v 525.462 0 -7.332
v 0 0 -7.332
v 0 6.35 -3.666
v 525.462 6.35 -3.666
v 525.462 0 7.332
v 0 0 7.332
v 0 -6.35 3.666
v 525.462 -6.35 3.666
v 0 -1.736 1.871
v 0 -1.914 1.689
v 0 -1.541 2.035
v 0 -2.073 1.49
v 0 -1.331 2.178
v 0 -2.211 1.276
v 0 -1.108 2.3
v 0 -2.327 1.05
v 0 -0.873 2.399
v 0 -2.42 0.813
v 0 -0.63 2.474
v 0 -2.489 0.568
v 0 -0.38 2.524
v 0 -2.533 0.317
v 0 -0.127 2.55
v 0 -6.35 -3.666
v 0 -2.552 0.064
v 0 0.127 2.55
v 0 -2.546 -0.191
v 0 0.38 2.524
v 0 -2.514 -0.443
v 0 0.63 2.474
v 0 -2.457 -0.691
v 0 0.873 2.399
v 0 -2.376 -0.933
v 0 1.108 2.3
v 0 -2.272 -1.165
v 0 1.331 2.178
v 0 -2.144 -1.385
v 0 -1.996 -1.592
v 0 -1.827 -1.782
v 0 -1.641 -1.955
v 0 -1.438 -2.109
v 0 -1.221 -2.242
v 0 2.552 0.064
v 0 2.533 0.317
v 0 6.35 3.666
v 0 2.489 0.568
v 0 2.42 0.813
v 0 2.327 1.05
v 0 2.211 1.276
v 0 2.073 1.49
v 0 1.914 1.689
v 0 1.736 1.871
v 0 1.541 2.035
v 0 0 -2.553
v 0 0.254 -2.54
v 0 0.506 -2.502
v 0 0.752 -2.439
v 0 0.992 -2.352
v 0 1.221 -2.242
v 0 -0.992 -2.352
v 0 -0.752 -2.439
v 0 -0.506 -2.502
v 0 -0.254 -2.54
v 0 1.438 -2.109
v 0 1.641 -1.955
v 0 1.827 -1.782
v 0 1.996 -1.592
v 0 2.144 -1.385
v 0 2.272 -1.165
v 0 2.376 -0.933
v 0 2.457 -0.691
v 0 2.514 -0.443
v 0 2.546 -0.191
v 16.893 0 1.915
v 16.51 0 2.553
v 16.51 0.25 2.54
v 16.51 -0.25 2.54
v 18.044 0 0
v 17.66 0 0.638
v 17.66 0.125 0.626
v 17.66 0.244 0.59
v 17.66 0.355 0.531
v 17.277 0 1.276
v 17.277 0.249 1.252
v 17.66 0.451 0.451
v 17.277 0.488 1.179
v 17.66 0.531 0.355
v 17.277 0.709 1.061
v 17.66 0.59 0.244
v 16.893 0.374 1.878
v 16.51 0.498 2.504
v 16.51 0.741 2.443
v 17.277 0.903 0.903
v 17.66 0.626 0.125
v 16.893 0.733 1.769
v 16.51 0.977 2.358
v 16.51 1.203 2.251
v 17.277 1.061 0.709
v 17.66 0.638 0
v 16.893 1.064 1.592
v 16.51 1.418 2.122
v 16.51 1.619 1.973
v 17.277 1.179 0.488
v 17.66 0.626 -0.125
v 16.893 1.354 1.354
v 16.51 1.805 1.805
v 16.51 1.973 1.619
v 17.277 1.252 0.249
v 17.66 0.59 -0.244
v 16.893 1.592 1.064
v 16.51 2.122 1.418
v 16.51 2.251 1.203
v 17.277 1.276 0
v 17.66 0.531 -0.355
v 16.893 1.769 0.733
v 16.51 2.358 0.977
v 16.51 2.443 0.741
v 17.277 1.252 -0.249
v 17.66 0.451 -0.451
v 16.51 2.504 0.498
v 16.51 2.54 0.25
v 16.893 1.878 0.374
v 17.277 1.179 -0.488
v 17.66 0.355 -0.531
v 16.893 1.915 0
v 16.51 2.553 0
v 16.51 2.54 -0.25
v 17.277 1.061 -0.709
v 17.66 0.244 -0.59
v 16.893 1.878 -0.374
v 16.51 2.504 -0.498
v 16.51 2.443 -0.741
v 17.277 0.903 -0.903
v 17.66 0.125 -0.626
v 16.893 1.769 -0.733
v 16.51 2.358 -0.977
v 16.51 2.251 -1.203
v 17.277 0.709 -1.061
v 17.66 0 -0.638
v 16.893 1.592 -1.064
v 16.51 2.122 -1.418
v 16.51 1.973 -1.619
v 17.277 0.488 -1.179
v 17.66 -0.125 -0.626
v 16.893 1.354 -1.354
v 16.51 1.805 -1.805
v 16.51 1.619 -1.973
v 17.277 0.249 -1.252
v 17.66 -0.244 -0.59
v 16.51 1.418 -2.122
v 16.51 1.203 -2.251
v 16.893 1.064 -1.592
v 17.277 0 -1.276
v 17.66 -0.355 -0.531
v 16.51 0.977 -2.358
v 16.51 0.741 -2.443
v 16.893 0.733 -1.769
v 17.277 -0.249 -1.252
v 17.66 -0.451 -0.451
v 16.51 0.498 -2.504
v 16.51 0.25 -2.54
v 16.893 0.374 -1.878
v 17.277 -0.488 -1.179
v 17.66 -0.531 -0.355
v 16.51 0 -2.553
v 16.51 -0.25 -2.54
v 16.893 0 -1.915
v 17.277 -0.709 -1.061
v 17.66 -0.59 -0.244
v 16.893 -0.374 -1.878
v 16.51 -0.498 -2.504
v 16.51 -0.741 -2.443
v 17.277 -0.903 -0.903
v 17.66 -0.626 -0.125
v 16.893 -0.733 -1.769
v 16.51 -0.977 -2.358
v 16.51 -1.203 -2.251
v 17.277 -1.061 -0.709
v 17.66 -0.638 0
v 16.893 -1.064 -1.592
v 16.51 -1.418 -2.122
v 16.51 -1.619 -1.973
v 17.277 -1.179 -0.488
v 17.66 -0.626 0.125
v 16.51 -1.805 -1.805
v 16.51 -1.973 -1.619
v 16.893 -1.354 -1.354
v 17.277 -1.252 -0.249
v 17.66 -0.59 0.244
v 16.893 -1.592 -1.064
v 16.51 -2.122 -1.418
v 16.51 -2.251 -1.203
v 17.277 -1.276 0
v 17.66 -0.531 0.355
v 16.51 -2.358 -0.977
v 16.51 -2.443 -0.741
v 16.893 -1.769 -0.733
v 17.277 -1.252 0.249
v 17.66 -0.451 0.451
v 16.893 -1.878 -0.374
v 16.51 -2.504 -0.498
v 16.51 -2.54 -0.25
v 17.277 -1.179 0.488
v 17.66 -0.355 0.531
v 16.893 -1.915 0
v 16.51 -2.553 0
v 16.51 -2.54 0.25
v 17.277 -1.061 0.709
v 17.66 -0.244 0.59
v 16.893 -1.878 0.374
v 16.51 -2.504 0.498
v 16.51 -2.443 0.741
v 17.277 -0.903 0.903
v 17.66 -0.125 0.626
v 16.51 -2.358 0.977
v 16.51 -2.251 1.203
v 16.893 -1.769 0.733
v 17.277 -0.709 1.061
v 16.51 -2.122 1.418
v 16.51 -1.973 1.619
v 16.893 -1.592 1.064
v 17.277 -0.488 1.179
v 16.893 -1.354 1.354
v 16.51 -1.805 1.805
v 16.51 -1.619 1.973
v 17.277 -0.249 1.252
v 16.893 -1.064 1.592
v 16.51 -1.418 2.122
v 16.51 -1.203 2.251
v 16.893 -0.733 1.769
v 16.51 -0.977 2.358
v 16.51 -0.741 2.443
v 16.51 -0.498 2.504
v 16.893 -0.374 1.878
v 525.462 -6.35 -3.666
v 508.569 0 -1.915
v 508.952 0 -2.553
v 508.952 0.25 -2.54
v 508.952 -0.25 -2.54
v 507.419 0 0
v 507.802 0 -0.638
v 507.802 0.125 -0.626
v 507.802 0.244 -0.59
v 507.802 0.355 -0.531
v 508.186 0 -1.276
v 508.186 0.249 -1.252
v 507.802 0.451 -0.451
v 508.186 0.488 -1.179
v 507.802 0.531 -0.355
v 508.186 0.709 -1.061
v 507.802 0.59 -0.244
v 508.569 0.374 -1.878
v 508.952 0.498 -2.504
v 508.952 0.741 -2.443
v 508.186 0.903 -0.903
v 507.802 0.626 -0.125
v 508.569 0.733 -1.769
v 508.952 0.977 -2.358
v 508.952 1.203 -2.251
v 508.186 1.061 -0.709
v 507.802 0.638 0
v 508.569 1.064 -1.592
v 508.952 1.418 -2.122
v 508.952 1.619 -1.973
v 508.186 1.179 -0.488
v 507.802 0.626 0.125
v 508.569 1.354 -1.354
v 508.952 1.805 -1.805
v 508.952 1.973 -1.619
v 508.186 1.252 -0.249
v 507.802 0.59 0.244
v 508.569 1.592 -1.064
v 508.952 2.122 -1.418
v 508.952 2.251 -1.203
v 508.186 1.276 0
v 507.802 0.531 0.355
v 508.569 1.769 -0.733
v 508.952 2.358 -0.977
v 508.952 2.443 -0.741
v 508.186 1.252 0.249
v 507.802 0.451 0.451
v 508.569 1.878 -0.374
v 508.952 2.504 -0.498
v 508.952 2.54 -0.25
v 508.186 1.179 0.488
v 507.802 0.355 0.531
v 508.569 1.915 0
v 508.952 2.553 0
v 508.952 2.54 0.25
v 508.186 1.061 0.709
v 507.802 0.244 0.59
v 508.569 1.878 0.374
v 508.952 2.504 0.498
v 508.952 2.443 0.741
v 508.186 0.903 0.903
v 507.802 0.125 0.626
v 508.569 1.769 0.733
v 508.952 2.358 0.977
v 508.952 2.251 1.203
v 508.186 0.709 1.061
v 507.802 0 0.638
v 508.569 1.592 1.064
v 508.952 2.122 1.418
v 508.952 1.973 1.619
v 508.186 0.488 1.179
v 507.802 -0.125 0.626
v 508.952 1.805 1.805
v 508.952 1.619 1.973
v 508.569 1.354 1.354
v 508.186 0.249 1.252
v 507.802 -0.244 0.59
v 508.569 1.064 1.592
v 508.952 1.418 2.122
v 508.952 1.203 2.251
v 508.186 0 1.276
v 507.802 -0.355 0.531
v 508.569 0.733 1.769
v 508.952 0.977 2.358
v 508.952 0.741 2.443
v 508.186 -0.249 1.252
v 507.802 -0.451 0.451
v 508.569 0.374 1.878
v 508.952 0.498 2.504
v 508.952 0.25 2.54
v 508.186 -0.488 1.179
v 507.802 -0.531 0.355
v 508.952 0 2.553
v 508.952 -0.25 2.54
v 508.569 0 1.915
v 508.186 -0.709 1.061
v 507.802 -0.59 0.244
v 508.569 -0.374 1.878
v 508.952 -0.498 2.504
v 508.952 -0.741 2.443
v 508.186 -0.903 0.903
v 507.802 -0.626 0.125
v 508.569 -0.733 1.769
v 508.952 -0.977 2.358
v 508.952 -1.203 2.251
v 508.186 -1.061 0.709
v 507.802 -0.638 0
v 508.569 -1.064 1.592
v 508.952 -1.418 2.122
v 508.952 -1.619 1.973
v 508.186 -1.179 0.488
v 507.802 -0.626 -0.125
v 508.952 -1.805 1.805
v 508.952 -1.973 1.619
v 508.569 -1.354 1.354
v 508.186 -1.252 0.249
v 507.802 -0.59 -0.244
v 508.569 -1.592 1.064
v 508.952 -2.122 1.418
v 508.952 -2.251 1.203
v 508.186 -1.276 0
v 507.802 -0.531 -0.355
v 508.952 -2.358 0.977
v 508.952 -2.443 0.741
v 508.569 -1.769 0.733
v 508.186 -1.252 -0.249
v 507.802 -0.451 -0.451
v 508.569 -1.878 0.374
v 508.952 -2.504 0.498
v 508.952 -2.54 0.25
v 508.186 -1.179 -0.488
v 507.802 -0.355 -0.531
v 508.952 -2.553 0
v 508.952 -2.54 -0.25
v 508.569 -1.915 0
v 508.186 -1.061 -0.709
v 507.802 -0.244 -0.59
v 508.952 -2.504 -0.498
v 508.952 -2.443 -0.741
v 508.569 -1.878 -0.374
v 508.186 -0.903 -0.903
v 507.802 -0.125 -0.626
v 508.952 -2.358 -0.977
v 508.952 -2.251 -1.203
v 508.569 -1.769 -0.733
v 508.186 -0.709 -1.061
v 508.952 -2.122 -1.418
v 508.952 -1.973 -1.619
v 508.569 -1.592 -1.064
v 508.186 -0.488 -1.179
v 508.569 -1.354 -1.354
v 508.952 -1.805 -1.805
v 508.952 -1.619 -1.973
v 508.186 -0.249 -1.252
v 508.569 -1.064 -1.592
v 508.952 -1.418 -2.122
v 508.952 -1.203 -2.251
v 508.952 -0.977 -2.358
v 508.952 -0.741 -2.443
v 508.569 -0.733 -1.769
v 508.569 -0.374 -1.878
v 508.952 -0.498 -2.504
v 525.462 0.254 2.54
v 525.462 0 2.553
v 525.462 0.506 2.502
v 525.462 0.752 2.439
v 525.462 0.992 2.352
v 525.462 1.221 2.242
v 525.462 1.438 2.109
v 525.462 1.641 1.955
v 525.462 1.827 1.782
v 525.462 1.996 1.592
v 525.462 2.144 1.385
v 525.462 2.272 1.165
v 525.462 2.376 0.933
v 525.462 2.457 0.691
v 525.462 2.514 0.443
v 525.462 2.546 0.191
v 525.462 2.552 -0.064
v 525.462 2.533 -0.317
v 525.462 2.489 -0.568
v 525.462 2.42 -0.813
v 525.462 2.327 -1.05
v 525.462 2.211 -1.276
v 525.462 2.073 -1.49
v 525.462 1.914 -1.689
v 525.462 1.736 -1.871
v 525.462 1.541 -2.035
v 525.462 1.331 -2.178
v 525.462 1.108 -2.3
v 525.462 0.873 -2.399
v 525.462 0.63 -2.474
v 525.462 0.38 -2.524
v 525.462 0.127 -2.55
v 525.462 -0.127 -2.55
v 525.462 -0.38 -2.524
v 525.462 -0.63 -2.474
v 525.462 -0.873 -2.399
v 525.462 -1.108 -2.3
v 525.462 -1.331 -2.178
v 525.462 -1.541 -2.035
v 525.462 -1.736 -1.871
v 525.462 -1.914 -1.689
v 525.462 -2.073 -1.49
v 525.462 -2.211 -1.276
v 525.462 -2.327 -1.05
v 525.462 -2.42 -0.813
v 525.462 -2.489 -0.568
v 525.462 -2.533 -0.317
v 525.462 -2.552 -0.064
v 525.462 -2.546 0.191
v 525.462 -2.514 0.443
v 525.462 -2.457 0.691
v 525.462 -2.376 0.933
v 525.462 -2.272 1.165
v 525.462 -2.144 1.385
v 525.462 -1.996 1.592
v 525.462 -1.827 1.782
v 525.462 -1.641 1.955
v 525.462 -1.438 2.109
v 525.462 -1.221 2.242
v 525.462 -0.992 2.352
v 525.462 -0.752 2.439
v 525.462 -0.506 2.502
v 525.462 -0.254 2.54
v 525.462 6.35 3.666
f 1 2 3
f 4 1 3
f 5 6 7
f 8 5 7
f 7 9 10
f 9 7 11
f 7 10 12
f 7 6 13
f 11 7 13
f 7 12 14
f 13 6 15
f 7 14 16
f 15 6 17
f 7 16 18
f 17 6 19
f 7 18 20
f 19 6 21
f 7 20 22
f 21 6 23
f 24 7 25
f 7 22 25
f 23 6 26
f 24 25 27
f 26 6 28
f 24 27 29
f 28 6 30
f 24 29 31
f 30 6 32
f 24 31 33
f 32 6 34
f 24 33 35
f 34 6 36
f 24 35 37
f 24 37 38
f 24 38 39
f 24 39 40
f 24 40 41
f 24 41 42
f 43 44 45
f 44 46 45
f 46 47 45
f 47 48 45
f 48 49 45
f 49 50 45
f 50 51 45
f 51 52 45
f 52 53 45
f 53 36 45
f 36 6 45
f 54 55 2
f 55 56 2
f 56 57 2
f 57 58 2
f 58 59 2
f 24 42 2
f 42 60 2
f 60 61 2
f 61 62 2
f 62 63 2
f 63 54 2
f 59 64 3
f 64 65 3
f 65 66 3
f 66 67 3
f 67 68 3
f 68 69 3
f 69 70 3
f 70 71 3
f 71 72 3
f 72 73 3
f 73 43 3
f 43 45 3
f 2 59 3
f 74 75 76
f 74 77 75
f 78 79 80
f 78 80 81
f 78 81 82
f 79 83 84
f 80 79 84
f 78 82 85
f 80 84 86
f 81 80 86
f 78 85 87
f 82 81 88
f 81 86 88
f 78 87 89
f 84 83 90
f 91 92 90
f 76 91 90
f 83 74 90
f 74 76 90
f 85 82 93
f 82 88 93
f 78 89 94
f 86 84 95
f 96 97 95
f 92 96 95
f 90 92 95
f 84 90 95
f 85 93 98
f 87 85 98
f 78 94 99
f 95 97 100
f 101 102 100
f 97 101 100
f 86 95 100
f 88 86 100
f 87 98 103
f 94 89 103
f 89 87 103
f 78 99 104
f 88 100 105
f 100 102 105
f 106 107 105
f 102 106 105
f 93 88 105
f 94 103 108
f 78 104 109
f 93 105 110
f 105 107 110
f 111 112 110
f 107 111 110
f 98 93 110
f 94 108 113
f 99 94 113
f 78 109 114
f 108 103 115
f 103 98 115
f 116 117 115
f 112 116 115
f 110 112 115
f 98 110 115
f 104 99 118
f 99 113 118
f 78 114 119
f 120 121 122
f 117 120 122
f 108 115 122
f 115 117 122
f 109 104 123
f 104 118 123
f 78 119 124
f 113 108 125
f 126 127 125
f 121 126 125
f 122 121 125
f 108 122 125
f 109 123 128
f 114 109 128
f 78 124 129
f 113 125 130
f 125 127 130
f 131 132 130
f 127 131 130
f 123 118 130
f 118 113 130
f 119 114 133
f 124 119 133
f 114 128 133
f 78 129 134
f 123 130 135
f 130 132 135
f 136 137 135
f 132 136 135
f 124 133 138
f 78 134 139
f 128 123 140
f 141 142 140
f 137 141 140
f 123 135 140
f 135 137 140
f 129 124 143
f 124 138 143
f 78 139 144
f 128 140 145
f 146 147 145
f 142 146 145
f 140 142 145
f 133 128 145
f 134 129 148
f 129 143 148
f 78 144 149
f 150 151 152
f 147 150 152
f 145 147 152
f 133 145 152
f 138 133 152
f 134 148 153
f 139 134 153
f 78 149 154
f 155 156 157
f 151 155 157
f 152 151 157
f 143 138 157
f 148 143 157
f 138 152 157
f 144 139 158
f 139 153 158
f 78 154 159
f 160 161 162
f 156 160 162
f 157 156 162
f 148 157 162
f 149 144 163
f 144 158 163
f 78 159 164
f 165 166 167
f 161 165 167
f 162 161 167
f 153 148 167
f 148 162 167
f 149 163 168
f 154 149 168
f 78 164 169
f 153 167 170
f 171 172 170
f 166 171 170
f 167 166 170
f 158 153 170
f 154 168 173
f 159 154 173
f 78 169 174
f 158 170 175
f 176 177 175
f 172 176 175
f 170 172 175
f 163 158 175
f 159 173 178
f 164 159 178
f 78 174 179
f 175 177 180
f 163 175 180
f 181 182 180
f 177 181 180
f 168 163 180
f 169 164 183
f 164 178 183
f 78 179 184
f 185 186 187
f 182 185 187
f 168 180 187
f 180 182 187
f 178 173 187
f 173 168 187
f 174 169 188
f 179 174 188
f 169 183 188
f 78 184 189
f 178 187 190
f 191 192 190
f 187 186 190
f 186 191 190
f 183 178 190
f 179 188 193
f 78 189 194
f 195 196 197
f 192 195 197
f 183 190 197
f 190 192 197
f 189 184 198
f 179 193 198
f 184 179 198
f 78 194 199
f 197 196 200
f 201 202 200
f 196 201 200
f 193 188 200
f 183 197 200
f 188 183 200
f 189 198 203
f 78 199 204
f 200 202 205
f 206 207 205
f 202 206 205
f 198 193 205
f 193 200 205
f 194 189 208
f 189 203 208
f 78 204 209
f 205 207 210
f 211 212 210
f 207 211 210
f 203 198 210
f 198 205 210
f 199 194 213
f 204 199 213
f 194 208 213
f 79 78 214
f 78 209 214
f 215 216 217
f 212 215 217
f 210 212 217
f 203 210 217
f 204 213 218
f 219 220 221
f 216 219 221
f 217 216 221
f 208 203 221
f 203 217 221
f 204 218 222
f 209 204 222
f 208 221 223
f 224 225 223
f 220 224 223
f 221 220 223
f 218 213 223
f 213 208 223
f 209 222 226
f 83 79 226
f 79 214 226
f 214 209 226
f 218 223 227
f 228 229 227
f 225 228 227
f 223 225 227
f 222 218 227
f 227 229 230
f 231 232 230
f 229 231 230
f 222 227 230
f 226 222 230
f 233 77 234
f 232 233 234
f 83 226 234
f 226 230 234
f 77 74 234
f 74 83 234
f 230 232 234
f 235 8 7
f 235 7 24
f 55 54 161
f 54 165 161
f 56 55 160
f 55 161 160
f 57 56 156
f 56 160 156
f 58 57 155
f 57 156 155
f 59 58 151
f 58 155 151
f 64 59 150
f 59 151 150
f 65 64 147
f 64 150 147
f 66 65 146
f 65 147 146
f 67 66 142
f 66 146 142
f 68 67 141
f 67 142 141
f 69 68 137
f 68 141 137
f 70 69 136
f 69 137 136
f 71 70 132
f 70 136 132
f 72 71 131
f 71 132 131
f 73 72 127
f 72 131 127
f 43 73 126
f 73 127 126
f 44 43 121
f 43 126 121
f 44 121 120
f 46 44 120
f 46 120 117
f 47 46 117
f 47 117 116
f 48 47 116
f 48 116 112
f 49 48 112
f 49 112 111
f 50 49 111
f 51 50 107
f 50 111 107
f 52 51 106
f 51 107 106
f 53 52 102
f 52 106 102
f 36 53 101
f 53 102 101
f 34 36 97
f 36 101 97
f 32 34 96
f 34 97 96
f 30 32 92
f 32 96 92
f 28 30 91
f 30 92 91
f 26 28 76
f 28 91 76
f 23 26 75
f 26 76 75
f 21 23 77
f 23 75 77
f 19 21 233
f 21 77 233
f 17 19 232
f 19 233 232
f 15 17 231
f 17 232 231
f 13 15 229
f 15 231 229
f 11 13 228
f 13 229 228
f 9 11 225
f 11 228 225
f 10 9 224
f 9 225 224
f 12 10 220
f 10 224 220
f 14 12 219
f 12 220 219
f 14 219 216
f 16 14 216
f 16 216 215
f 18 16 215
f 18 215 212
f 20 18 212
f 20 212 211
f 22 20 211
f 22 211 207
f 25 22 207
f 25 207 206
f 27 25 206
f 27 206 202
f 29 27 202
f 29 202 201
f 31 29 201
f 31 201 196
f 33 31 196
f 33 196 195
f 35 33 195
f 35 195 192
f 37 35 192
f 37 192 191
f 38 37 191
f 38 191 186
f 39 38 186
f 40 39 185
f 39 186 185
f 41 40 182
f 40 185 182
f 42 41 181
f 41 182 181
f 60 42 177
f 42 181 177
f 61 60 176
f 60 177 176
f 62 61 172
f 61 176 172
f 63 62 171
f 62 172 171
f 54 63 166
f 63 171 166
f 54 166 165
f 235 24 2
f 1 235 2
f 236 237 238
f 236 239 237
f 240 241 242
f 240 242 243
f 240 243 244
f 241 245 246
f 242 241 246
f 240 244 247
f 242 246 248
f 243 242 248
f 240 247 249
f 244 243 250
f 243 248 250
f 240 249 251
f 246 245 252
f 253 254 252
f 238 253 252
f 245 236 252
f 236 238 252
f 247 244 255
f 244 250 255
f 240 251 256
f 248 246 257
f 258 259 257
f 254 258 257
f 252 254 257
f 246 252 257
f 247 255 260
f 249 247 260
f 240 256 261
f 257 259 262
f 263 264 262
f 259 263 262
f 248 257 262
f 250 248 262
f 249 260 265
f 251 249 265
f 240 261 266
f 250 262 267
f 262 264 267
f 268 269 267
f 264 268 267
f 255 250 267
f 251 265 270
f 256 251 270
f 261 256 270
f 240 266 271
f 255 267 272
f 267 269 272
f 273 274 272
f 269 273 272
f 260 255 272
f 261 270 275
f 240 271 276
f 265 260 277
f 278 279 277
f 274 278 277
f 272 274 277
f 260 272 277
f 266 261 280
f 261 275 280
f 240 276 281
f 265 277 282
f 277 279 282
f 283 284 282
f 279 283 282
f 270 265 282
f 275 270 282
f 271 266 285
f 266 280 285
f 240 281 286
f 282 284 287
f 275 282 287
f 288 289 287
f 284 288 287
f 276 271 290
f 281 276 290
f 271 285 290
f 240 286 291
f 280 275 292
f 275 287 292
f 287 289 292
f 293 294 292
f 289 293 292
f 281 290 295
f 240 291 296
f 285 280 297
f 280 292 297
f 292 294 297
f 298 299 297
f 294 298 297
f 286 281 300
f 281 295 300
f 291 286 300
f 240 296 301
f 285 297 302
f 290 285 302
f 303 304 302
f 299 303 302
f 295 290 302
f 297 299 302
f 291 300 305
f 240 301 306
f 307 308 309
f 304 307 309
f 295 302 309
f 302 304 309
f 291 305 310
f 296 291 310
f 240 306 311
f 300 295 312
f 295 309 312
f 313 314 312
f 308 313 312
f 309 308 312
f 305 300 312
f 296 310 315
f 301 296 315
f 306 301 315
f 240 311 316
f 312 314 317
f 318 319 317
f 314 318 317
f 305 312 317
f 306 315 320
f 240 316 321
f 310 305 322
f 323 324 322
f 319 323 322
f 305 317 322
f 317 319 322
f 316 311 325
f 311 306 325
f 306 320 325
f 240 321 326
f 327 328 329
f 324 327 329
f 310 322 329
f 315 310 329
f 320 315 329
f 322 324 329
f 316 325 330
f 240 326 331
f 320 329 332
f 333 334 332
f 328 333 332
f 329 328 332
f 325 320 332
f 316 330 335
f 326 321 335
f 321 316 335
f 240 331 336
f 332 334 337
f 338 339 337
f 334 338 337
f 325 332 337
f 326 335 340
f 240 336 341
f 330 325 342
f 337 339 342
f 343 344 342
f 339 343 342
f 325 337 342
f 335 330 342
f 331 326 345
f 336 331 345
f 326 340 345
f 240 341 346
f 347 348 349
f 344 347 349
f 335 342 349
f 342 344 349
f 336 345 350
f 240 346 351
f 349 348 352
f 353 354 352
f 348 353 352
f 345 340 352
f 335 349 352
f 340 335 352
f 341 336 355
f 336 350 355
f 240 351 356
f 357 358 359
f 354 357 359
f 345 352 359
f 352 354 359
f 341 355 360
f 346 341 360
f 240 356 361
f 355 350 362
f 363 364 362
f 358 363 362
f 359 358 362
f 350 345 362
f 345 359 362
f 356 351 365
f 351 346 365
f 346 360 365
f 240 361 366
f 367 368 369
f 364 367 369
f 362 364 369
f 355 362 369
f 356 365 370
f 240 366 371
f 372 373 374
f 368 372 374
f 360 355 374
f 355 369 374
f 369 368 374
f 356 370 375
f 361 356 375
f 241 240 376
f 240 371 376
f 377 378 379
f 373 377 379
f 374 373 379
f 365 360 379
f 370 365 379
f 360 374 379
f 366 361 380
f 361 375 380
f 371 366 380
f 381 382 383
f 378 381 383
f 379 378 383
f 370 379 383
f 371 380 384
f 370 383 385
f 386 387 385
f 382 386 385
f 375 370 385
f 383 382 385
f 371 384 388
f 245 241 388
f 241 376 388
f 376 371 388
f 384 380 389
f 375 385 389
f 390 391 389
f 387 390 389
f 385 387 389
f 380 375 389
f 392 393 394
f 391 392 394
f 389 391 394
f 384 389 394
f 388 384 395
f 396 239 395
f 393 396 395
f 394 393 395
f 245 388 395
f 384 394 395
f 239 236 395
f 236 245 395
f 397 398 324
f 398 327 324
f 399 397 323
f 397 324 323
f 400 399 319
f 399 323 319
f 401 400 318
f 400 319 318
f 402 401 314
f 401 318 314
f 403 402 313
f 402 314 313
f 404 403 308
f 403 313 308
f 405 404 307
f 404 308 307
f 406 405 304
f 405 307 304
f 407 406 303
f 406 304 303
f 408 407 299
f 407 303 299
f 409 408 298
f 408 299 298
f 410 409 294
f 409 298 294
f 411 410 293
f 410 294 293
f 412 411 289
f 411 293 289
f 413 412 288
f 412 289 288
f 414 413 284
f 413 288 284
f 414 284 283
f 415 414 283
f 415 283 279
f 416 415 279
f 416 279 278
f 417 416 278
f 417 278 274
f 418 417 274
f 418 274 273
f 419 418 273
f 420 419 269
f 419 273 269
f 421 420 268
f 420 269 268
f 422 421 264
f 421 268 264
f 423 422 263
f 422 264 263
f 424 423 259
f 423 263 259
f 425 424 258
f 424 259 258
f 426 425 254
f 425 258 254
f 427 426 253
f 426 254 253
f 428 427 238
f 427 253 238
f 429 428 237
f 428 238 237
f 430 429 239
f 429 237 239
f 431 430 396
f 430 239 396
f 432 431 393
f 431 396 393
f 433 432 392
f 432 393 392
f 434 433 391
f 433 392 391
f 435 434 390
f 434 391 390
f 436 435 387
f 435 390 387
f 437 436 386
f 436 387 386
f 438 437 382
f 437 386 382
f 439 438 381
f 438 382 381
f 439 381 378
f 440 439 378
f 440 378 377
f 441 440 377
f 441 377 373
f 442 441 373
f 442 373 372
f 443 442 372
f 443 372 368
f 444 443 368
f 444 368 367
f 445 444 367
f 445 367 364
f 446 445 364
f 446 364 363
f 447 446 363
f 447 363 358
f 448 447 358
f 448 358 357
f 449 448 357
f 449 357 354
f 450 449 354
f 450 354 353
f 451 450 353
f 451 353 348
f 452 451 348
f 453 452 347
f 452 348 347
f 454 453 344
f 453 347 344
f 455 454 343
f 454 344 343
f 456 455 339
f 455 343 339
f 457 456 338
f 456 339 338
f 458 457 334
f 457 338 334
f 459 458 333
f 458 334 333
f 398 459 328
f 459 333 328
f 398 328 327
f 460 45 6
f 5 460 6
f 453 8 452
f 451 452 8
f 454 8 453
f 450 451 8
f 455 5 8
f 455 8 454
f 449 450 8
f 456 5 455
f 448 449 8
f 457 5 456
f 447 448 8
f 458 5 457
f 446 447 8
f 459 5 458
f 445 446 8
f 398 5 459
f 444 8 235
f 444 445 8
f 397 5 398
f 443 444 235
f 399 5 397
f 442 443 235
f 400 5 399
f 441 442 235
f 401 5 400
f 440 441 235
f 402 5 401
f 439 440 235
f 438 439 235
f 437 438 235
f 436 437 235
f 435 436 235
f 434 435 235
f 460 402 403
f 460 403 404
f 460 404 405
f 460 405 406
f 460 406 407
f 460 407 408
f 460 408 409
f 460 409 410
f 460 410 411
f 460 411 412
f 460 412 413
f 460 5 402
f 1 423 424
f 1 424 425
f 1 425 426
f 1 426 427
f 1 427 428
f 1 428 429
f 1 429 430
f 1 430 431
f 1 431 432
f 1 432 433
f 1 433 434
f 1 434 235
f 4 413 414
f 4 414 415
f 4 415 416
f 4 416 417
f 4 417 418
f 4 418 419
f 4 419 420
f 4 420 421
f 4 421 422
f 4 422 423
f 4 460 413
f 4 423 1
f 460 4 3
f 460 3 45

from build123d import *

# Parameters (mm, degrees)
BOSS_EXTRUDE1_DEPTH         = 525.4625
F_1_4_20_TAPPED_HOLE1_D     = 5.1054
F_1_4_20_TAPPED_HOLE1_DEPTH = 16.51
F_1_4_20_TAPPED_HOLE1_TIP   = 1.533816902
F_1_4_20_TAPPED_HOLE2_D     = 5.1054
F_1_4_20_TAPPED_HOLE2_DEPTH = 16.51
F_1_4_20_TAPPED_HOLE2_TIP   = 1.533816902


with BuildPart() as part:
    # Sketch1 → Boss-Extrude1 (new body)
    with BuildSketch(Plane(origin=(0, 0, 0), x_dir=(0, 0, -1), z_dir=(1, 0, 0))):
        Polygon((7.332348419, 0), (3.666174209, 6.35), (-3.666174209, 6.35), (-7.332348419, 0), (-3.666174209, -6.35), (3.666174209, -6.35), align=None)
    extrude(amount=BOSS_EXTRUDE1_DEPTH)

    # 1/4-20 Tapped Hole1
    with Locations(Plane(origin=(525.4625, 0, 0), x_dir=(0, 0, -1), z_dir=(1, 0, 0))):
        with Locations((0, 0)):
            Hole(F_1_4_20_TAPPED_HOLE1_D / 2, depth=F_1_4_20_TAPPED_HOLE1_DEPTH)
            with Locations((0, 0, -(F_1_4_20_TAPPED_HOLE1_DEPTH + F_1_4_20_TAPPED_HOLE1_TIP / 2))):  # 118° drill point
                Cone(0, F_1_4_20_TAPPED_HOLE1_D / 2, F_1_4_20_TAPPED_HOLE1_TIP, mode=Mode.SUBTRACT)

    # 1/4-20 Tapped Hole2
    with Locations(Plane.ZY):
        with Locations((0, 0)):
            Hole(F_1_4_20_TAPPED_HOLE2_D / 2, depth=F_1_4_20_TAPPED_HOLE2_DEPTH)
            with Locations((0, 0, -(F_1_4_20_TAPPED_HOLE2_DEPTH + F_1_4_20_TAPPED_HOLE2_TIP / 2))):  # 118° drill point
                Cone(0, F_1_4_20_TAPPED_HOLE2_D / 2, F_1_4_20_TAPPED_HOLE2_TIP, mode=Mode.SUBTRACT)


solid = part.part
